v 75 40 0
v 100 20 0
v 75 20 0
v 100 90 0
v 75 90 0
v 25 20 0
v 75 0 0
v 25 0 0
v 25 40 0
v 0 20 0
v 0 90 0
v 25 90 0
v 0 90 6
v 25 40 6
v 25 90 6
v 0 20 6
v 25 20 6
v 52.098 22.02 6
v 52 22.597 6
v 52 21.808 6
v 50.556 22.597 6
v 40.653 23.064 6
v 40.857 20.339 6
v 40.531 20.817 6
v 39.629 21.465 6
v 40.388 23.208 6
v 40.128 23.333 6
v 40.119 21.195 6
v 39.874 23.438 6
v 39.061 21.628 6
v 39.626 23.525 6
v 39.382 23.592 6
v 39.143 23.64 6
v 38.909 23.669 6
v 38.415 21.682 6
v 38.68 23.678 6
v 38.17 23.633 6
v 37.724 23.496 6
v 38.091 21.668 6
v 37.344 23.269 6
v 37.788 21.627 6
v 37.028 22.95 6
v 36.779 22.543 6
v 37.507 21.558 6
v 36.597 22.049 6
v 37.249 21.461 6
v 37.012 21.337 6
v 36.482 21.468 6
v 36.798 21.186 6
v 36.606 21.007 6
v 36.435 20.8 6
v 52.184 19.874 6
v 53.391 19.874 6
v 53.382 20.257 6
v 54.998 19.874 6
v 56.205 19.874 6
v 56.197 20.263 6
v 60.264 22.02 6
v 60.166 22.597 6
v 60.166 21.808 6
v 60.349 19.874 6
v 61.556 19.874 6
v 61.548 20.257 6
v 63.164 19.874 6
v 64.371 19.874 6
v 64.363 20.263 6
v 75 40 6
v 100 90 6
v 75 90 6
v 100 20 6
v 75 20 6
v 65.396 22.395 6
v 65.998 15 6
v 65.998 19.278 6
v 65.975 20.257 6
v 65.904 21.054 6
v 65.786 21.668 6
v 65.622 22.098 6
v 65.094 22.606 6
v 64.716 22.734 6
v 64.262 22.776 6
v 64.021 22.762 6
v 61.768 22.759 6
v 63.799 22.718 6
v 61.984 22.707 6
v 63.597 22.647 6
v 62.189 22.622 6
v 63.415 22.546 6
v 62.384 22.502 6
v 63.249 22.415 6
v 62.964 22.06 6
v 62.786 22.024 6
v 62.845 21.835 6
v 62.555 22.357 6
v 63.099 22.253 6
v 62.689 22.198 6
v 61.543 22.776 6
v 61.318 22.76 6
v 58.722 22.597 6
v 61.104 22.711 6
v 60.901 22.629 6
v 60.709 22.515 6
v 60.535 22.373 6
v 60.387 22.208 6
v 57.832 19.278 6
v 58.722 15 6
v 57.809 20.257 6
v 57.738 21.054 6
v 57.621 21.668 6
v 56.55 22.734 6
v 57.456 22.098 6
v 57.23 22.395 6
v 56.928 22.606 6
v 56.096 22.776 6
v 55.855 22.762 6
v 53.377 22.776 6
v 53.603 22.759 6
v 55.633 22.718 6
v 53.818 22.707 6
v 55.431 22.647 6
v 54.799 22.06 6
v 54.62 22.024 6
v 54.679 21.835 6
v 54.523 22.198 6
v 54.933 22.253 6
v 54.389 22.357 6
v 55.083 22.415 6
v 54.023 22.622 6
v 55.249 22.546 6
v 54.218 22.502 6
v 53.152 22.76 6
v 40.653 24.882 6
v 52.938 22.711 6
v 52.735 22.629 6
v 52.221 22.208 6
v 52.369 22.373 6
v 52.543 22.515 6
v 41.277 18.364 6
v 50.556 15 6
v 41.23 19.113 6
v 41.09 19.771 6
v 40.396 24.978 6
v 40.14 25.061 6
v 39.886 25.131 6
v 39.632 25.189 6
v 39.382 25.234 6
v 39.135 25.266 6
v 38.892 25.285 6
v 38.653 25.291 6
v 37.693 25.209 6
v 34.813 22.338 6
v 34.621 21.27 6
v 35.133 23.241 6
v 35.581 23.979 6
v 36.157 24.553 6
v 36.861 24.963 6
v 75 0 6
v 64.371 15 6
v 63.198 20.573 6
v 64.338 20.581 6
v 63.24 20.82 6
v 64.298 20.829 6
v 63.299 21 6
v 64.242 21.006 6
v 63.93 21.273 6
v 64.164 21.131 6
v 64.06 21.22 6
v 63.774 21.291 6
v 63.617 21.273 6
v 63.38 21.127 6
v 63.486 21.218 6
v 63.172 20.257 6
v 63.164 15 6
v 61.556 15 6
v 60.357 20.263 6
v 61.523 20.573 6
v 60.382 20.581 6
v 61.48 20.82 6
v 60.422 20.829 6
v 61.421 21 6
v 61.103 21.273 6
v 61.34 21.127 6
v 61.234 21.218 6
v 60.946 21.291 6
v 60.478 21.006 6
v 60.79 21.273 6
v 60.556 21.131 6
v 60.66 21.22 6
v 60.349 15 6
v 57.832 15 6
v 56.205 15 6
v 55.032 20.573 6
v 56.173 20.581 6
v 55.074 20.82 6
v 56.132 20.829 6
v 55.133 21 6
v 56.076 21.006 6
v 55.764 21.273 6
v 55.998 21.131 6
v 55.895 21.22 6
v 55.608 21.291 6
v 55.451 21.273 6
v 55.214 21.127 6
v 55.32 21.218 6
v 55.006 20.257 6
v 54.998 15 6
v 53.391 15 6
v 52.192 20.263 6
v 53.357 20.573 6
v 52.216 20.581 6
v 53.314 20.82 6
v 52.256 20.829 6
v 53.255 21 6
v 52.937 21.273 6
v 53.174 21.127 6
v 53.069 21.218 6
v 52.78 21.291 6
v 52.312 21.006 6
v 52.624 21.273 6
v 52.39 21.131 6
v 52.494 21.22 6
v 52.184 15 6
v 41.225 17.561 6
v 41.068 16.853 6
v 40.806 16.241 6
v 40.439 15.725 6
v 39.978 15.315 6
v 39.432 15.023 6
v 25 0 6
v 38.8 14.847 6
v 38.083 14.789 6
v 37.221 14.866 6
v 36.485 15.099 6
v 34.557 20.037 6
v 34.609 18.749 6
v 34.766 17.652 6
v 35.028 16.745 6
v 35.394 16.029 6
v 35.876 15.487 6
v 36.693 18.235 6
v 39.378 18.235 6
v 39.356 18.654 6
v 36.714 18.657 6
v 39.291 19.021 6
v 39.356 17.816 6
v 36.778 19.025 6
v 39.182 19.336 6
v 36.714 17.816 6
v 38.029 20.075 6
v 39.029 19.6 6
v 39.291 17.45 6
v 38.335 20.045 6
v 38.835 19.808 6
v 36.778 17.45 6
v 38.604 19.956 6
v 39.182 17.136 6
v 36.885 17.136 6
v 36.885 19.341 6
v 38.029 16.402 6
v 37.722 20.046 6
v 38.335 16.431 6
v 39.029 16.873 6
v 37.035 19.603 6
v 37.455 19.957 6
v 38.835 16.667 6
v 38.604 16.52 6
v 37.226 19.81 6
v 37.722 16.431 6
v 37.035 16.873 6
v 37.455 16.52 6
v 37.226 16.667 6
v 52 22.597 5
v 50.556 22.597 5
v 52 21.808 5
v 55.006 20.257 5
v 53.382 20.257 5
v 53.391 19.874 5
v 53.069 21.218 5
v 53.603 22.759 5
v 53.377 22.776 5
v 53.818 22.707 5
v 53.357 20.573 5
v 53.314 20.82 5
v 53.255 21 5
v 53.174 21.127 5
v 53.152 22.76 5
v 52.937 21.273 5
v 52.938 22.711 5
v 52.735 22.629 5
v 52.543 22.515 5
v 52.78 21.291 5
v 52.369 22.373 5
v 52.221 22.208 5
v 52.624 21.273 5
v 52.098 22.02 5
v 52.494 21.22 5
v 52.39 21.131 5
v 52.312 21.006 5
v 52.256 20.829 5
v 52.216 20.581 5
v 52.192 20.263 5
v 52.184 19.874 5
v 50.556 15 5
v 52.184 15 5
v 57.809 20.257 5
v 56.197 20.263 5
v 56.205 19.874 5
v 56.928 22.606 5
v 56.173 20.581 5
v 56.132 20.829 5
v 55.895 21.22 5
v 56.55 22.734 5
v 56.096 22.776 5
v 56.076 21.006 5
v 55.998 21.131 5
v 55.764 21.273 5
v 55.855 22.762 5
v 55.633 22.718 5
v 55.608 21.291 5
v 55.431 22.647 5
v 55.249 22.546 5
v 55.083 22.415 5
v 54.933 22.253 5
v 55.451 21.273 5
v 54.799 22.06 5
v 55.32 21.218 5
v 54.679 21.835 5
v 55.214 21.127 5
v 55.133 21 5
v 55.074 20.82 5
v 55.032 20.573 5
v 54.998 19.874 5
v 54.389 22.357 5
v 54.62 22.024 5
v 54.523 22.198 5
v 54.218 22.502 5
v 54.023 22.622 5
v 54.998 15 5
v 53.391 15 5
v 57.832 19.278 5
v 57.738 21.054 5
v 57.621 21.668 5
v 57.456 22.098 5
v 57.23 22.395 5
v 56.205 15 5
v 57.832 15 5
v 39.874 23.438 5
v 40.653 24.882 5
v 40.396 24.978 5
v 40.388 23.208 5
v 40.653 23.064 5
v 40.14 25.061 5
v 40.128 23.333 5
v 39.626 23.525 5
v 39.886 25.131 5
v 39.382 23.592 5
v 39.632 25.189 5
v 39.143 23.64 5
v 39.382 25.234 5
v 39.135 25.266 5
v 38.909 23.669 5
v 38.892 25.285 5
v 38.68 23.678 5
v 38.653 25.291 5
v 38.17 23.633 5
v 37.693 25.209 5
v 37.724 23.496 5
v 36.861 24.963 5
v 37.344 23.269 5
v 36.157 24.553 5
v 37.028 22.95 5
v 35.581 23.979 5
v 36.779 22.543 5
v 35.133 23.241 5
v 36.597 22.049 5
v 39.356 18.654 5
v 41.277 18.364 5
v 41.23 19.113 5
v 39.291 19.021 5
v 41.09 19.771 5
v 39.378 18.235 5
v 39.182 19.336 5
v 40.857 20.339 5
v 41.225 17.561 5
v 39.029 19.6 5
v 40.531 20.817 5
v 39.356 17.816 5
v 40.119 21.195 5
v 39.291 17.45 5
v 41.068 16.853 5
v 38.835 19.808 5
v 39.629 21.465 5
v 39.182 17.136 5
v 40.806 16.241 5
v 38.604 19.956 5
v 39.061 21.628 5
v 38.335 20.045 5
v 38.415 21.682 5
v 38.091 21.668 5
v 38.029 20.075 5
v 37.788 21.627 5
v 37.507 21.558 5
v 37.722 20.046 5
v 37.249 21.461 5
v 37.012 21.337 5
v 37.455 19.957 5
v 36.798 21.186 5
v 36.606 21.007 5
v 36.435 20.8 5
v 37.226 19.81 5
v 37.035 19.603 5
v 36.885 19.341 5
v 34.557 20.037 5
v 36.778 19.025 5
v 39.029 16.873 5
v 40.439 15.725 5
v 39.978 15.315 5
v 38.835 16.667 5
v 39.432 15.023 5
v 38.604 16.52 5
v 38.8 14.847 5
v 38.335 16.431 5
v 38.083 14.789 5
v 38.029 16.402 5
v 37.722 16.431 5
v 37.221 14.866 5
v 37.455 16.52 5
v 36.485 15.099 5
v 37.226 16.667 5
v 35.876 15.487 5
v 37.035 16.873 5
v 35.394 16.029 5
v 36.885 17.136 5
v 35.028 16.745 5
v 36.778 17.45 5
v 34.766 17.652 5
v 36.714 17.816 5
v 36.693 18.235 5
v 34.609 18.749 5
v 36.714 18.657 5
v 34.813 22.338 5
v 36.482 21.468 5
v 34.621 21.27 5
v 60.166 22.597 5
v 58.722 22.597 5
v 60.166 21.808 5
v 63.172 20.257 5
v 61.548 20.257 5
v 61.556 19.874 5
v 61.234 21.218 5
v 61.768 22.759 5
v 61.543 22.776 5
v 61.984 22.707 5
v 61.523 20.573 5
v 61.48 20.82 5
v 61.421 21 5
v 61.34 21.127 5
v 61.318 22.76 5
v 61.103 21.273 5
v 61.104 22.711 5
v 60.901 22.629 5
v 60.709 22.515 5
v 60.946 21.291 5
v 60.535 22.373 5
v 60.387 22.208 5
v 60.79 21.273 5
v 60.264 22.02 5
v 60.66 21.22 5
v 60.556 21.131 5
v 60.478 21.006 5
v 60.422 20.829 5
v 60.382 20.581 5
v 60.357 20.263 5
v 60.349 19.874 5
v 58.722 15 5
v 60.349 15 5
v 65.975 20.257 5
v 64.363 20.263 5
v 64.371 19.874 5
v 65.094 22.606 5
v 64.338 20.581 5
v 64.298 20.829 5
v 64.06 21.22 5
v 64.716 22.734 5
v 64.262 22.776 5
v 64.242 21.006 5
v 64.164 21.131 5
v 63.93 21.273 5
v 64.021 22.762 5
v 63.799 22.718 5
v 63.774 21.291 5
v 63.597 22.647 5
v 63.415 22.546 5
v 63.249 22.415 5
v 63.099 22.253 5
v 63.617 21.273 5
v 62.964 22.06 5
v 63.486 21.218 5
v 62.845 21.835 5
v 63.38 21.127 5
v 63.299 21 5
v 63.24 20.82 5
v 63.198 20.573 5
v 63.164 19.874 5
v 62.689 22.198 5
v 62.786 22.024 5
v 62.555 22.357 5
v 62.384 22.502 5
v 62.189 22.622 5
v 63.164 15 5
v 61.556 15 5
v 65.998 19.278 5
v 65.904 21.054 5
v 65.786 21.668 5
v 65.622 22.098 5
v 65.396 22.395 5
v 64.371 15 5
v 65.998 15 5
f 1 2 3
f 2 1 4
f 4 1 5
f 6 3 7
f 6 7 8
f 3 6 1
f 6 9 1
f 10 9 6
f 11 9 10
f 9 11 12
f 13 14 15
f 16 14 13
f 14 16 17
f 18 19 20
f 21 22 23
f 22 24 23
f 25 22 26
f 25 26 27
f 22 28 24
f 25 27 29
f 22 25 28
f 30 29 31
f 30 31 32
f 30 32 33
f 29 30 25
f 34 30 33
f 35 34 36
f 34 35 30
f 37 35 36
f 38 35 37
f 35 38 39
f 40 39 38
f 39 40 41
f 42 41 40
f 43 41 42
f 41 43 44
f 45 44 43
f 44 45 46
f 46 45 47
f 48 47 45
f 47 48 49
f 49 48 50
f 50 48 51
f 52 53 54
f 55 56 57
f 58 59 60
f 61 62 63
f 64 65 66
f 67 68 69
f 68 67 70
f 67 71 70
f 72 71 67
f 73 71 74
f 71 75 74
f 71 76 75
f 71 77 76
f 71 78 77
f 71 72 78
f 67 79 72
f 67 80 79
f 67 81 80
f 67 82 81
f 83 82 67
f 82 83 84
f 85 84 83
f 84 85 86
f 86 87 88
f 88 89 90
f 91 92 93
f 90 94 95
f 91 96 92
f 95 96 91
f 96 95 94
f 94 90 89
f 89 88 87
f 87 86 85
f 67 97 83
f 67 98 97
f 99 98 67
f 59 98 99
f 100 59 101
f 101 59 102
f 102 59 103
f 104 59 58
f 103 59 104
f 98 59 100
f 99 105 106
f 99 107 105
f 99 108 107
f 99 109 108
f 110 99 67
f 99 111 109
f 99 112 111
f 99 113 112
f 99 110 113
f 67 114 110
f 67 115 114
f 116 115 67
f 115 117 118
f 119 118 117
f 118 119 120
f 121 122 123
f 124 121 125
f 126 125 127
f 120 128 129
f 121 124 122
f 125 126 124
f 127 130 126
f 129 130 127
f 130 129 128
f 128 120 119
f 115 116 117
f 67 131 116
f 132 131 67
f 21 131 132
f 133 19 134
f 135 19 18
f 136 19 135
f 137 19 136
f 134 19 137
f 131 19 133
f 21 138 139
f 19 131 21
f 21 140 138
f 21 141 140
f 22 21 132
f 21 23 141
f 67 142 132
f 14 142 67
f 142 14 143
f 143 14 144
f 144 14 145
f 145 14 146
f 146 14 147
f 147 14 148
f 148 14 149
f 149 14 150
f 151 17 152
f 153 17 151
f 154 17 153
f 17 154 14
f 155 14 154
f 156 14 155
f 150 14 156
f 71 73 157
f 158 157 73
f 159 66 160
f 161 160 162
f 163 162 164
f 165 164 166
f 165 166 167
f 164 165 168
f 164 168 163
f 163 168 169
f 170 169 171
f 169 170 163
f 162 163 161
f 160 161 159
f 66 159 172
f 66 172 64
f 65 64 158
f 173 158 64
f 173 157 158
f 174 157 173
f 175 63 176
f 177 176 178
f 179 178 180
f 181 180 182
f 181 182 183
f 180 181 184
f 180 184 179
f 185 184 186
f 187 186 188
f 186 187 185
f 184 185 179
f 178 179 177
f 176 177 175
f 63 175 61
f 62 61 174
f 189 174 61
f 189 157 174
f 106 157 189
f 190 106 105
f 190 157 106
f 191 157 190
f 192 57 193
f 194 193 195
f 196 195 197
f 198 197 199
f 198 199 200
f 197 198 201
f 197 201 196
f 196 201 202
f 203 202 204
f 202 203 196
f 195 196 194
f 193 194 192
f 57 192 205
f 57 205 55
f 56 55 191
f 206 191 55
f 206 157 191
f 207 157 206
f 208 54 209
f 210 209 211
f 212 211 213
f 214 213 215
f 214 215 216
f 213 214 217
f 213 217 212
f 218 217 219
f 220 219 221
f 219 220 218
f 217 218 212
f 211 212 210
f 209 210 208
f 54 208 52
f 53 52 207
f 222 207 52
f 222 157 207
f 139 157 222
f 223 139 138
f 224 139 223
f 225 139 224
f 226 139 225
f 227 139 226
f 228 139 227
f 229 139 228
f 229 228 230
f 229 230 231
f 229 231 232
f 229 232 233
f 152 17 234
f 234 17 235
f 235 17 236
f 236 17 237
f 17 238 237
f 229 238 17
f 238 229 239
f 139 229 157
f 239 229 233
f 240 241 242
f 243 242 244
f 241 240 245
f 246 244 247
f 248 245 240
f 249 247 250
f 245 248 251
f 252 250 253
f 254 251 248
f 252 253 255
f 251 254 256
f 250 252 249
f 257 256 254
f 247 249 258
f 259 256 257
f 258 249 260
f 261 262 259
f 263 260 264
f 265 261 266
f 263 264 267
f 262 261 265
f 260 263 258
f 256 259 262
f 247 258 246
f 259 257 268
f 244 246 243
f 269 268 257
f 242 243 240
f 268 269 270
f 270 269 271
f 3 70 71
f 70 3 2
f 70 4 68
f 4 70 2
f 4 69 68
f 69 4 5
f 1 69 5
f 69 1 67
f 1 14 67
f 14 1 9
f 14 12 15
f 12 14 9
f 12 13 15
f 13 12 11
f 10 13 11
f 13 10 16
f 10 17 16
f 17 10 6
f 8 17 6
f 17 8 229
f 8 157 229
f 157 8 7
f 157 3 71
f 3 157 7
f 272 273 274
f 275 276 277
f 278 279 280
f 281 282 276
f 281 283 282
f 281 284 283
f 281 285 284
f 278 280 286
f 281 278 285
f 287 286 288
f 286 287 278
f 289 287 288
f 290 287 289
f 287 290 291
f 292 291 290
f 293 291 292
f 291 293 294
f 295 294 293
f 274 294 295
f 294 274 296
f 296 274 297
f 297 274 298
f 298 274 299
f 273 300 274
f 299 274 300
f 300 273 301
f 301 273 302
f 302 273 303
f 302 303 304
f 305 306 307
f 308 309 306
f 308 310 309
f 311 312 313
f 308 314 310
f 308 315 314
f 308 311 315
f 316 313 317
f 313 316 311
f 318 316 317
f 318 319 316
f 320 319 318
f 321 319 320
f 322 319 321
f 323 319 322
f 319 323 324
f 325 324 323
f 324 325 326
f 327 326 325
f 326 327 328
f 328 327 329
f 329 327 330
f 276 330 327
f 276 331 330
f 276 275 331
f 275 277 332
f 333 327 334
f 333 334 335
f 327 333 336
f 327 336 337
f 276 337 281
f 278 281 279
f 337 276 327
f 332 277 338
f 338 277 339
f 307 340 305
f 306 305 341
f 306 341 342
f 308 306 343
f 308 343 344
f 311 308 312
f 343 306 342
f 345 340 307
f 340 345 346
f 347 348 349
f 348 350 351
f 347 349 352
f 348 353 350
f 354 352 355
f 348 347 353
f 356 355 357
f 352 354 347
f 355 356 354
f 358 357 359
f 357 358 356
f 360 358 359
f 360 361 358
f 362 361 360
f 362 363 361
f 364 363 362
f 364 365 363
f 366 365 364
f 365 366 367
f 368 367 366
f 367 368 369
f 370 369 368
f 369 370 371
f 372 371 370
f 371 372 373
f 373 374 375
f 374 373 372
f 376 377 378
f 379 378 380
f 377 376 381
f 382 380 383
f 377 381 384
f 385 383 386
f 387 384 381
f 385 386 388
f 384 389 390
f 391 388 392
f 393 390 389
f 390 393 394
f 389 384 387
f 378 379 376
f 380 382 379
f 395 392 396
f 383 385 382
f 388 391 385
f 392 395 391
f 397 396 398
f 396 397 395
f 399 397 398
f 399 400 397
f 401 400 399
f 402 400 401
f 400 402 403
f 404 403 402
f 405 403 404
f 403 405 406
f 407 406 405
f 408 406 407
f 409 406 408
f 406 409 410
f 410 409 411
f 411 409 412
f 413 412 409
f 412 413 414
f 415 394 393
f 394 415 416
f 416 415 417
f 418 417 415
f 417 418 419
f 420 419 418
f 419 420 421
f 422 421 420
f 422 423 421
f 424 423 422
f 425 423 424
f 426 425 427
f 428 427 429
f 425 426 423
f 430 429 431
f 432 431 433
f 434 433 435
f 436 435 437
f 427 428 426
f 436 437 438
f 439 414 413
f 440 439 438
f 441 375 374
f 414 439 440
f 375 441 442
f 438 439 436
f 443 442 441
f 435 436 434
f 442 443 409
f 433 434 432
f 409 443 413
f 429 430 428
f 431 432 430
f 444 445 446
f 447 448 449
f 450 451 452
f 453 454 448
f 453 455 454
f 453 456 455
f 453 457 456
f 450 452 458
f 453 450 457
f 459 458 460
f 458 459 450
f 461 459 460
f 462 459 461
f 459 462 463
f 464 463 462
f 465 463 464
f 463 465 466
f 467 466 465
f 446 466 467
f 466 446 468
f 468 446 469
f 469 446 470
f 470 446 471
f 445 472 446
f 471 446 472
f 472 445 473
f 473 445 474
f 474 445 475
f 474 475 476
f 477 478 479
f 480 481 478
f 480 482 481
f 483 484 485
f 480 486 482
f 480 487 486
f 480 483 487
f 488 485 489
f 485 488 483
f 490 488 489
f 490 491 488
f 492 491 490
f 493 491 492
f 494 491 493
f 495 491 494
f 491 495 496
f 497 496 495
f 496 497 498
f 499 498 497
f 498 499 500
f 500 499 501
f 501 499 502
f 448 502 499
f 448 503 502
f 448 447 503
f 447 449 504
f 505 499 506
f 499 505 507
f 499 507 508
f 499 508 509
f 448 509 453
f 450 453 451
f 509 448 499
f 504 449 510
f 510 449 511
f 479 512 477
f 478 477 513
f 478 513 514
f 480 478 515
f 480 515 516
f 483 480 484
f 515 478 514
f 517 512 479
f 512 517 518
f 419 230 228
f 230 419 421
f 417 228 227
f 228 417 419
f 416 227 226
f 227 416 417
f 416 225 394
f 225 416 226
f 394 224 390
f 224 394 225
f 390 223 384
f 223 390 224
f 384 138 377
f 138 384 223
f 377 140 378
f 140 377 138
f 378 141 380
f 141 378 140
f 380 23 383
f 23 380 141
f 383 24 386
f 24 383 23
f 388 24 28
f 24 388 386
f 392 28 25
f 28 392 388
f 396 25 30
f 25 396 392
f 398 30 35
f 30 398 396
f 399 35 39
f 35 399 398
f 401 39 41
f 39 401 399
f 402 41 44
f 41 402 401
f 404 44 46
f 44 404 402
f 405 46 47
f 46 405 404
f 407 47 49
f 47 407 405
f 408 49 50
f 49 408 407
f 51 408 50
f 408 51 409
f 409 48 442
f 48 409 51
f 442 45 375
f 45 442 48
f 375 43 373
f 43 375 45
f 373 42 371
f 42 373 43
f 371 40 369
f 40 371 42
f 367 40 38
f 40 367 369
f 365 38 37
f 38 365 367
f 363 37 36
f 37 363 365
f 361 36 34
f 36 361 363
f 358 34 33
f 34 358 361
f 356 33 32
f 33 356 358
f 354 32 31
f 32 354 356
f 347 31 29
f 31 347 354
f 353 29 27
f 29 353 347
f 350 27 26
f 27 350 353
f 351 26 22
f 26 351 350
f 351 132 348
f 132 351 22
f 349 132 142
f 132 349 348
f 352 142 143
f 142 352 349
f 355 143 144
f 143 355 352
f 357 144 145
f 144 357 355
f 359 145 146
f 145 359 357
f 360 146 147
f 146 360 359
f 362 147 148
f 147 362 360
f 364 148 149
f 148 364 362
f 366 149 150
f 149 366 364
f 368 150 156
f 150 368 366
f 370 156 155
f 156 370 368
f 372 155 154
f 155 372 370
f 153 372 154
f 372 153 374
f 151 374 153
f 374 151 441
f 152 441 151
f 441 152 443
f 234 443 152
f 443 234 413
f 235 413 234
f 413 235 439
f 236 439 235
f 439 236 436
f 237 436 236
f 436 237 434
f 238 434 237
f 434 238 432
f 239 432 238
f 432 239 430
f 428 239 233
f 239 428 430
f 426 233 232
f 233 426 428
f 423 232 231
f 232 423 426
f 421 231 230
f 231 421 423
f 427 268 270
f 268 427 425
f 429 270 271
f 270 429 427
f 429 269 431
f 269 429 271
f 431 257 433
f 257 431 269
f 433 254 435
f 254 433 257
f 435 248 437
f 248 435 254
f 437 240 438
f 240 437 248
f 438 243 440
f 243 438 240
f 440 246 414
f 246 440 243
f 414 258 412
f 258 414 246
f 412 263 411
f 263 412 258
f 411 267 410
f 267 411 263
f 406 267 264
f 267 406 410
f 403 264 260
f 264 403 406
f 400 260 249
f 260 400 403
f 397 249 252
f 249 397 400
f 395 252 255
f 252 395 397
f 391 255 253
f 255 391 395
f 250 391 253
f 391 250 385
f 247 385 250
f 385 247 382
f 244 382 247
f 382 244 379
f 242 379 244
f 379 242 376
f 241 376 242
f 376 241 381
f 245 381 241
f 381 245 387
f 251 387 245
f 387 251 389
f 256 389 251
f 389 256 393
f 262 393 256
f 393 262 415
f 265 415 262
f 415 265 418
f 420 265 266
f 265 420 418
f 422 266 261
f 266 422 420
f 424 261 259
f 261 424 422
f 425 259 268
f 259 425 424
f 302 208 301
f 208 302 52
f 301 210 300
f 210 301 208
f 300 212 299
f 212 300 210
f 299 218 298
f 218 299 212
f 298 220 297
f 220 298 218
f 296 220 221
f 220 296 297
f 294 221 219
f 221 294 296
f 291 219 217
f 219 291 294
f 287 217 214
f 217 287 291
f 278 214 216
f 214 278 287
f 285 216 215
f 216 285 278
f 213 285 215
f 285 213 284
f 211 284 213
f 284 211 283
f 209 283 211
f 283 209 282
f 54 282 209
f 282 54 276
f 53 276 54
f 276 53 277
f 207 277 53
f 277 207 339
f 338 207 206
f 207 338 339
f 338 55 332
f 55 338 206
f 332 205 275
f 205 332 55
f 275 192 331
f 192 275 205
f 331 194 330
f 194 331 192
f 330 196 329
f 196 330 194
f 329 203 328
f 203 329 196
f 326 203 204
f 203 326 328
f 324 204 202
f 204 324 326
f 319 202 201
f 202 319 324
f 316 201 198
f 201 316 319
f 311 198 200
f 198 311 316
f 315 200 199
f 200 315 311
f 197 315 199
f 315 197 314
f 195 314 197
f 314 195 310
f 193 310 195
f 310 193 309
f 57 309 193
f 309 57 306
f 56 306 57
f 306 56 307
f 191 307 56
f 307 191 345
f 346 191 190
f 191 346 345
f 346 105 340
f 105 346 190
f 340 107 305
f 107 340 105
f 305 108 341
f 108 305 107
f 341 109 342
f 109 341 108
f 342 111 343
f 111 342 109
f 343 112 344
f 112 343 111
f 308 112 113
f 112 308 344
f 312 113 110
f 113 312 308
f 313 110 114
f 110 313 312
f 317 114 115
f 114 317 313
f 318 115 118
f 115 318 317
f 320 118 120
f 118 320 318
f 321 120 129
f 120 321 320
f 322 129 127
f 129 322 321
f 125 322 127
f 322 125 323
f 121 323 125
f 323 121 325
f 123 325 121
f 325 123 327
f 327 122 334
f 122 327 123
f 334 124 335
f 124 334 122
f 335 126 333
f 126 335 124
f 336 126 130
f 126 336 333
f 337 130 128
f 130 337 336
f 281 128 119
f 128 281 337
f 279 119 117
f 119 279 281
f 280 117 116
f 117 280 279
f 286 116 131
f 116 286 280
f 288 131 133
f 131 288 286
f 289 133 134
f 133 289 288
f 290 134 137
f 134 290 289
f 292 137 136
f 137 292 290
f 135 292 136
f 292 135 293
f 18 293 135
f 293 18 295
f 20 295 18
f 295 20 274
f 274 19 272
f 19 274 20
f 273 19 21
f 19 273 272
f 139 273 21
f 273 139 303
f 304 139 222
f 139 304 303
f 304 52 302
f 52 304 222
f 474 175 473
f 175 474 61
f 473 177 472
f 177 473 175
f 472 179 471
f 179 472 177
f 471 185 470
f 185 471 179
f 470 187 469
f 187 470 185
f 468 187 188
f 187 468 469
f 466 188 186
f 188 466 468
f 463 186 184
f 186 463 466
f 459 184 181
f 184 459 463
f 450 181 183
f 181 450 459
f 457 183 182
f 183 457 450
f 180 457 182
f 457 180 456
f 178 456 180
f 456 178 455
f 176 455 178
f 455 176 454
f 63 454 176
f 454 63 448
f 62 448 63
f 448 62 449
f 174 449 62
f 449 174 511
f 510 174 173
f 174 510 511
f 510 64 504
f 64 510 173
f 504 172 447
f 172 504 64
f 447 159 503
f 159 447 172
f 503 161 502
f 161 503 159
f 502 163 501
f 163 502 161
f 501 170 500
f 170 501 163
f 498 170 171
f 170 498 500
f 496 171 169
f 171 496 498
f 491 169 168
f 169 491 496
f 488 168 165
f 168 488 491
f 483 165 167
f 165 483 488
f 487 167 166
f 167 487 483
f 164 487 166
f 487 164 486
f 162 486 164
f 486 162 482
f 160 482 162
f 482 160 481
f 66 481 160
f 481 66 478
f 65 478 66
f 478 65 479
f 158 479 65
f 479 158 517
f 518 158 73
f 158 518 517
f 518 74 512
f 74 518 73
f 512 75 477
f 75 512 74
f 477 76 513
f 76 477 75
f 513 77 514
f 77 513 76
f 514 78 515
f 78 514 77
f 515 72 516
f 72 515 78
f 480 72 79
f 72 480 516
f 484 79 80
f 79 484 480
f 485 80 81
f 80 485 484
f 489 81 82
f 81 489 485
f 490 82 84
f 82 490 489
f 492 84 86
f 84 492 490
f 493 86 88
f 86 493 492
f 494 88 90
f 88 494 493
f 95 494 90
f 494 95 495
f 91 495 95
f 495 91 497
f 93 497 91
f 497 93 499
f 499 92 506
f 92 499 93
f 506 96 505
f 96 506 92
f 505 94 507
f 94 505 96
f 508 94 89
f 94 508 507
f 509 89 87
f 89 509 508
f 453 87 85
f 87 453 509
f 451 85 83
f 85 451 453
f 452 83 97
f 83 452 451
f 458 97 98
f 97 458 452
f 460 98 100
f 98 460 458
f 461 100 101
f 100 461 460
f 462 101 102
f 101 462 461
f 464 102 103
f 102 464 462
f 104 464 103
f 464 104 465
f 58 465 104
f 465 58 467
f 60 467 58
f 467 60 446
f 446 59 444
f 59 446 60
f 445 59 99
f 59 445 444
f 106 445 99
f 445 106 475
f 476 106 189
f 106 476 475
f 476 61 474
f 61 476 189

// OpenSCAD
shim_thickness=6;

width=100;

groove=50;

length=90;

tab_lgth=20;

groovestart=40;

label=15;

difference() {
    forme();
    texte();
}

module forme() {
    a=width/2-groove/2;
    b=width/2+groove/2;
    c=width;
    d=length;
    f=tab_lgth;
    g=groovestart;
    
    linear_extrude(height = shim_thickness)
    polygon([[a,0], [a,f], [0,f], [0,d], [a,d], [a,g], [b,g], [b,d], [c,d], [c,f], [b,f], [b,0]]);
}

module texte() {
    e=width/2;
    h=label;
    color([1,0,0])
    translate([e,h,shim_thickness-1])
    linear_extrude(height = 1)
    text(str(shim_thickness, " mm"), font = "Consolas:style=Bold", halign="center");
}
